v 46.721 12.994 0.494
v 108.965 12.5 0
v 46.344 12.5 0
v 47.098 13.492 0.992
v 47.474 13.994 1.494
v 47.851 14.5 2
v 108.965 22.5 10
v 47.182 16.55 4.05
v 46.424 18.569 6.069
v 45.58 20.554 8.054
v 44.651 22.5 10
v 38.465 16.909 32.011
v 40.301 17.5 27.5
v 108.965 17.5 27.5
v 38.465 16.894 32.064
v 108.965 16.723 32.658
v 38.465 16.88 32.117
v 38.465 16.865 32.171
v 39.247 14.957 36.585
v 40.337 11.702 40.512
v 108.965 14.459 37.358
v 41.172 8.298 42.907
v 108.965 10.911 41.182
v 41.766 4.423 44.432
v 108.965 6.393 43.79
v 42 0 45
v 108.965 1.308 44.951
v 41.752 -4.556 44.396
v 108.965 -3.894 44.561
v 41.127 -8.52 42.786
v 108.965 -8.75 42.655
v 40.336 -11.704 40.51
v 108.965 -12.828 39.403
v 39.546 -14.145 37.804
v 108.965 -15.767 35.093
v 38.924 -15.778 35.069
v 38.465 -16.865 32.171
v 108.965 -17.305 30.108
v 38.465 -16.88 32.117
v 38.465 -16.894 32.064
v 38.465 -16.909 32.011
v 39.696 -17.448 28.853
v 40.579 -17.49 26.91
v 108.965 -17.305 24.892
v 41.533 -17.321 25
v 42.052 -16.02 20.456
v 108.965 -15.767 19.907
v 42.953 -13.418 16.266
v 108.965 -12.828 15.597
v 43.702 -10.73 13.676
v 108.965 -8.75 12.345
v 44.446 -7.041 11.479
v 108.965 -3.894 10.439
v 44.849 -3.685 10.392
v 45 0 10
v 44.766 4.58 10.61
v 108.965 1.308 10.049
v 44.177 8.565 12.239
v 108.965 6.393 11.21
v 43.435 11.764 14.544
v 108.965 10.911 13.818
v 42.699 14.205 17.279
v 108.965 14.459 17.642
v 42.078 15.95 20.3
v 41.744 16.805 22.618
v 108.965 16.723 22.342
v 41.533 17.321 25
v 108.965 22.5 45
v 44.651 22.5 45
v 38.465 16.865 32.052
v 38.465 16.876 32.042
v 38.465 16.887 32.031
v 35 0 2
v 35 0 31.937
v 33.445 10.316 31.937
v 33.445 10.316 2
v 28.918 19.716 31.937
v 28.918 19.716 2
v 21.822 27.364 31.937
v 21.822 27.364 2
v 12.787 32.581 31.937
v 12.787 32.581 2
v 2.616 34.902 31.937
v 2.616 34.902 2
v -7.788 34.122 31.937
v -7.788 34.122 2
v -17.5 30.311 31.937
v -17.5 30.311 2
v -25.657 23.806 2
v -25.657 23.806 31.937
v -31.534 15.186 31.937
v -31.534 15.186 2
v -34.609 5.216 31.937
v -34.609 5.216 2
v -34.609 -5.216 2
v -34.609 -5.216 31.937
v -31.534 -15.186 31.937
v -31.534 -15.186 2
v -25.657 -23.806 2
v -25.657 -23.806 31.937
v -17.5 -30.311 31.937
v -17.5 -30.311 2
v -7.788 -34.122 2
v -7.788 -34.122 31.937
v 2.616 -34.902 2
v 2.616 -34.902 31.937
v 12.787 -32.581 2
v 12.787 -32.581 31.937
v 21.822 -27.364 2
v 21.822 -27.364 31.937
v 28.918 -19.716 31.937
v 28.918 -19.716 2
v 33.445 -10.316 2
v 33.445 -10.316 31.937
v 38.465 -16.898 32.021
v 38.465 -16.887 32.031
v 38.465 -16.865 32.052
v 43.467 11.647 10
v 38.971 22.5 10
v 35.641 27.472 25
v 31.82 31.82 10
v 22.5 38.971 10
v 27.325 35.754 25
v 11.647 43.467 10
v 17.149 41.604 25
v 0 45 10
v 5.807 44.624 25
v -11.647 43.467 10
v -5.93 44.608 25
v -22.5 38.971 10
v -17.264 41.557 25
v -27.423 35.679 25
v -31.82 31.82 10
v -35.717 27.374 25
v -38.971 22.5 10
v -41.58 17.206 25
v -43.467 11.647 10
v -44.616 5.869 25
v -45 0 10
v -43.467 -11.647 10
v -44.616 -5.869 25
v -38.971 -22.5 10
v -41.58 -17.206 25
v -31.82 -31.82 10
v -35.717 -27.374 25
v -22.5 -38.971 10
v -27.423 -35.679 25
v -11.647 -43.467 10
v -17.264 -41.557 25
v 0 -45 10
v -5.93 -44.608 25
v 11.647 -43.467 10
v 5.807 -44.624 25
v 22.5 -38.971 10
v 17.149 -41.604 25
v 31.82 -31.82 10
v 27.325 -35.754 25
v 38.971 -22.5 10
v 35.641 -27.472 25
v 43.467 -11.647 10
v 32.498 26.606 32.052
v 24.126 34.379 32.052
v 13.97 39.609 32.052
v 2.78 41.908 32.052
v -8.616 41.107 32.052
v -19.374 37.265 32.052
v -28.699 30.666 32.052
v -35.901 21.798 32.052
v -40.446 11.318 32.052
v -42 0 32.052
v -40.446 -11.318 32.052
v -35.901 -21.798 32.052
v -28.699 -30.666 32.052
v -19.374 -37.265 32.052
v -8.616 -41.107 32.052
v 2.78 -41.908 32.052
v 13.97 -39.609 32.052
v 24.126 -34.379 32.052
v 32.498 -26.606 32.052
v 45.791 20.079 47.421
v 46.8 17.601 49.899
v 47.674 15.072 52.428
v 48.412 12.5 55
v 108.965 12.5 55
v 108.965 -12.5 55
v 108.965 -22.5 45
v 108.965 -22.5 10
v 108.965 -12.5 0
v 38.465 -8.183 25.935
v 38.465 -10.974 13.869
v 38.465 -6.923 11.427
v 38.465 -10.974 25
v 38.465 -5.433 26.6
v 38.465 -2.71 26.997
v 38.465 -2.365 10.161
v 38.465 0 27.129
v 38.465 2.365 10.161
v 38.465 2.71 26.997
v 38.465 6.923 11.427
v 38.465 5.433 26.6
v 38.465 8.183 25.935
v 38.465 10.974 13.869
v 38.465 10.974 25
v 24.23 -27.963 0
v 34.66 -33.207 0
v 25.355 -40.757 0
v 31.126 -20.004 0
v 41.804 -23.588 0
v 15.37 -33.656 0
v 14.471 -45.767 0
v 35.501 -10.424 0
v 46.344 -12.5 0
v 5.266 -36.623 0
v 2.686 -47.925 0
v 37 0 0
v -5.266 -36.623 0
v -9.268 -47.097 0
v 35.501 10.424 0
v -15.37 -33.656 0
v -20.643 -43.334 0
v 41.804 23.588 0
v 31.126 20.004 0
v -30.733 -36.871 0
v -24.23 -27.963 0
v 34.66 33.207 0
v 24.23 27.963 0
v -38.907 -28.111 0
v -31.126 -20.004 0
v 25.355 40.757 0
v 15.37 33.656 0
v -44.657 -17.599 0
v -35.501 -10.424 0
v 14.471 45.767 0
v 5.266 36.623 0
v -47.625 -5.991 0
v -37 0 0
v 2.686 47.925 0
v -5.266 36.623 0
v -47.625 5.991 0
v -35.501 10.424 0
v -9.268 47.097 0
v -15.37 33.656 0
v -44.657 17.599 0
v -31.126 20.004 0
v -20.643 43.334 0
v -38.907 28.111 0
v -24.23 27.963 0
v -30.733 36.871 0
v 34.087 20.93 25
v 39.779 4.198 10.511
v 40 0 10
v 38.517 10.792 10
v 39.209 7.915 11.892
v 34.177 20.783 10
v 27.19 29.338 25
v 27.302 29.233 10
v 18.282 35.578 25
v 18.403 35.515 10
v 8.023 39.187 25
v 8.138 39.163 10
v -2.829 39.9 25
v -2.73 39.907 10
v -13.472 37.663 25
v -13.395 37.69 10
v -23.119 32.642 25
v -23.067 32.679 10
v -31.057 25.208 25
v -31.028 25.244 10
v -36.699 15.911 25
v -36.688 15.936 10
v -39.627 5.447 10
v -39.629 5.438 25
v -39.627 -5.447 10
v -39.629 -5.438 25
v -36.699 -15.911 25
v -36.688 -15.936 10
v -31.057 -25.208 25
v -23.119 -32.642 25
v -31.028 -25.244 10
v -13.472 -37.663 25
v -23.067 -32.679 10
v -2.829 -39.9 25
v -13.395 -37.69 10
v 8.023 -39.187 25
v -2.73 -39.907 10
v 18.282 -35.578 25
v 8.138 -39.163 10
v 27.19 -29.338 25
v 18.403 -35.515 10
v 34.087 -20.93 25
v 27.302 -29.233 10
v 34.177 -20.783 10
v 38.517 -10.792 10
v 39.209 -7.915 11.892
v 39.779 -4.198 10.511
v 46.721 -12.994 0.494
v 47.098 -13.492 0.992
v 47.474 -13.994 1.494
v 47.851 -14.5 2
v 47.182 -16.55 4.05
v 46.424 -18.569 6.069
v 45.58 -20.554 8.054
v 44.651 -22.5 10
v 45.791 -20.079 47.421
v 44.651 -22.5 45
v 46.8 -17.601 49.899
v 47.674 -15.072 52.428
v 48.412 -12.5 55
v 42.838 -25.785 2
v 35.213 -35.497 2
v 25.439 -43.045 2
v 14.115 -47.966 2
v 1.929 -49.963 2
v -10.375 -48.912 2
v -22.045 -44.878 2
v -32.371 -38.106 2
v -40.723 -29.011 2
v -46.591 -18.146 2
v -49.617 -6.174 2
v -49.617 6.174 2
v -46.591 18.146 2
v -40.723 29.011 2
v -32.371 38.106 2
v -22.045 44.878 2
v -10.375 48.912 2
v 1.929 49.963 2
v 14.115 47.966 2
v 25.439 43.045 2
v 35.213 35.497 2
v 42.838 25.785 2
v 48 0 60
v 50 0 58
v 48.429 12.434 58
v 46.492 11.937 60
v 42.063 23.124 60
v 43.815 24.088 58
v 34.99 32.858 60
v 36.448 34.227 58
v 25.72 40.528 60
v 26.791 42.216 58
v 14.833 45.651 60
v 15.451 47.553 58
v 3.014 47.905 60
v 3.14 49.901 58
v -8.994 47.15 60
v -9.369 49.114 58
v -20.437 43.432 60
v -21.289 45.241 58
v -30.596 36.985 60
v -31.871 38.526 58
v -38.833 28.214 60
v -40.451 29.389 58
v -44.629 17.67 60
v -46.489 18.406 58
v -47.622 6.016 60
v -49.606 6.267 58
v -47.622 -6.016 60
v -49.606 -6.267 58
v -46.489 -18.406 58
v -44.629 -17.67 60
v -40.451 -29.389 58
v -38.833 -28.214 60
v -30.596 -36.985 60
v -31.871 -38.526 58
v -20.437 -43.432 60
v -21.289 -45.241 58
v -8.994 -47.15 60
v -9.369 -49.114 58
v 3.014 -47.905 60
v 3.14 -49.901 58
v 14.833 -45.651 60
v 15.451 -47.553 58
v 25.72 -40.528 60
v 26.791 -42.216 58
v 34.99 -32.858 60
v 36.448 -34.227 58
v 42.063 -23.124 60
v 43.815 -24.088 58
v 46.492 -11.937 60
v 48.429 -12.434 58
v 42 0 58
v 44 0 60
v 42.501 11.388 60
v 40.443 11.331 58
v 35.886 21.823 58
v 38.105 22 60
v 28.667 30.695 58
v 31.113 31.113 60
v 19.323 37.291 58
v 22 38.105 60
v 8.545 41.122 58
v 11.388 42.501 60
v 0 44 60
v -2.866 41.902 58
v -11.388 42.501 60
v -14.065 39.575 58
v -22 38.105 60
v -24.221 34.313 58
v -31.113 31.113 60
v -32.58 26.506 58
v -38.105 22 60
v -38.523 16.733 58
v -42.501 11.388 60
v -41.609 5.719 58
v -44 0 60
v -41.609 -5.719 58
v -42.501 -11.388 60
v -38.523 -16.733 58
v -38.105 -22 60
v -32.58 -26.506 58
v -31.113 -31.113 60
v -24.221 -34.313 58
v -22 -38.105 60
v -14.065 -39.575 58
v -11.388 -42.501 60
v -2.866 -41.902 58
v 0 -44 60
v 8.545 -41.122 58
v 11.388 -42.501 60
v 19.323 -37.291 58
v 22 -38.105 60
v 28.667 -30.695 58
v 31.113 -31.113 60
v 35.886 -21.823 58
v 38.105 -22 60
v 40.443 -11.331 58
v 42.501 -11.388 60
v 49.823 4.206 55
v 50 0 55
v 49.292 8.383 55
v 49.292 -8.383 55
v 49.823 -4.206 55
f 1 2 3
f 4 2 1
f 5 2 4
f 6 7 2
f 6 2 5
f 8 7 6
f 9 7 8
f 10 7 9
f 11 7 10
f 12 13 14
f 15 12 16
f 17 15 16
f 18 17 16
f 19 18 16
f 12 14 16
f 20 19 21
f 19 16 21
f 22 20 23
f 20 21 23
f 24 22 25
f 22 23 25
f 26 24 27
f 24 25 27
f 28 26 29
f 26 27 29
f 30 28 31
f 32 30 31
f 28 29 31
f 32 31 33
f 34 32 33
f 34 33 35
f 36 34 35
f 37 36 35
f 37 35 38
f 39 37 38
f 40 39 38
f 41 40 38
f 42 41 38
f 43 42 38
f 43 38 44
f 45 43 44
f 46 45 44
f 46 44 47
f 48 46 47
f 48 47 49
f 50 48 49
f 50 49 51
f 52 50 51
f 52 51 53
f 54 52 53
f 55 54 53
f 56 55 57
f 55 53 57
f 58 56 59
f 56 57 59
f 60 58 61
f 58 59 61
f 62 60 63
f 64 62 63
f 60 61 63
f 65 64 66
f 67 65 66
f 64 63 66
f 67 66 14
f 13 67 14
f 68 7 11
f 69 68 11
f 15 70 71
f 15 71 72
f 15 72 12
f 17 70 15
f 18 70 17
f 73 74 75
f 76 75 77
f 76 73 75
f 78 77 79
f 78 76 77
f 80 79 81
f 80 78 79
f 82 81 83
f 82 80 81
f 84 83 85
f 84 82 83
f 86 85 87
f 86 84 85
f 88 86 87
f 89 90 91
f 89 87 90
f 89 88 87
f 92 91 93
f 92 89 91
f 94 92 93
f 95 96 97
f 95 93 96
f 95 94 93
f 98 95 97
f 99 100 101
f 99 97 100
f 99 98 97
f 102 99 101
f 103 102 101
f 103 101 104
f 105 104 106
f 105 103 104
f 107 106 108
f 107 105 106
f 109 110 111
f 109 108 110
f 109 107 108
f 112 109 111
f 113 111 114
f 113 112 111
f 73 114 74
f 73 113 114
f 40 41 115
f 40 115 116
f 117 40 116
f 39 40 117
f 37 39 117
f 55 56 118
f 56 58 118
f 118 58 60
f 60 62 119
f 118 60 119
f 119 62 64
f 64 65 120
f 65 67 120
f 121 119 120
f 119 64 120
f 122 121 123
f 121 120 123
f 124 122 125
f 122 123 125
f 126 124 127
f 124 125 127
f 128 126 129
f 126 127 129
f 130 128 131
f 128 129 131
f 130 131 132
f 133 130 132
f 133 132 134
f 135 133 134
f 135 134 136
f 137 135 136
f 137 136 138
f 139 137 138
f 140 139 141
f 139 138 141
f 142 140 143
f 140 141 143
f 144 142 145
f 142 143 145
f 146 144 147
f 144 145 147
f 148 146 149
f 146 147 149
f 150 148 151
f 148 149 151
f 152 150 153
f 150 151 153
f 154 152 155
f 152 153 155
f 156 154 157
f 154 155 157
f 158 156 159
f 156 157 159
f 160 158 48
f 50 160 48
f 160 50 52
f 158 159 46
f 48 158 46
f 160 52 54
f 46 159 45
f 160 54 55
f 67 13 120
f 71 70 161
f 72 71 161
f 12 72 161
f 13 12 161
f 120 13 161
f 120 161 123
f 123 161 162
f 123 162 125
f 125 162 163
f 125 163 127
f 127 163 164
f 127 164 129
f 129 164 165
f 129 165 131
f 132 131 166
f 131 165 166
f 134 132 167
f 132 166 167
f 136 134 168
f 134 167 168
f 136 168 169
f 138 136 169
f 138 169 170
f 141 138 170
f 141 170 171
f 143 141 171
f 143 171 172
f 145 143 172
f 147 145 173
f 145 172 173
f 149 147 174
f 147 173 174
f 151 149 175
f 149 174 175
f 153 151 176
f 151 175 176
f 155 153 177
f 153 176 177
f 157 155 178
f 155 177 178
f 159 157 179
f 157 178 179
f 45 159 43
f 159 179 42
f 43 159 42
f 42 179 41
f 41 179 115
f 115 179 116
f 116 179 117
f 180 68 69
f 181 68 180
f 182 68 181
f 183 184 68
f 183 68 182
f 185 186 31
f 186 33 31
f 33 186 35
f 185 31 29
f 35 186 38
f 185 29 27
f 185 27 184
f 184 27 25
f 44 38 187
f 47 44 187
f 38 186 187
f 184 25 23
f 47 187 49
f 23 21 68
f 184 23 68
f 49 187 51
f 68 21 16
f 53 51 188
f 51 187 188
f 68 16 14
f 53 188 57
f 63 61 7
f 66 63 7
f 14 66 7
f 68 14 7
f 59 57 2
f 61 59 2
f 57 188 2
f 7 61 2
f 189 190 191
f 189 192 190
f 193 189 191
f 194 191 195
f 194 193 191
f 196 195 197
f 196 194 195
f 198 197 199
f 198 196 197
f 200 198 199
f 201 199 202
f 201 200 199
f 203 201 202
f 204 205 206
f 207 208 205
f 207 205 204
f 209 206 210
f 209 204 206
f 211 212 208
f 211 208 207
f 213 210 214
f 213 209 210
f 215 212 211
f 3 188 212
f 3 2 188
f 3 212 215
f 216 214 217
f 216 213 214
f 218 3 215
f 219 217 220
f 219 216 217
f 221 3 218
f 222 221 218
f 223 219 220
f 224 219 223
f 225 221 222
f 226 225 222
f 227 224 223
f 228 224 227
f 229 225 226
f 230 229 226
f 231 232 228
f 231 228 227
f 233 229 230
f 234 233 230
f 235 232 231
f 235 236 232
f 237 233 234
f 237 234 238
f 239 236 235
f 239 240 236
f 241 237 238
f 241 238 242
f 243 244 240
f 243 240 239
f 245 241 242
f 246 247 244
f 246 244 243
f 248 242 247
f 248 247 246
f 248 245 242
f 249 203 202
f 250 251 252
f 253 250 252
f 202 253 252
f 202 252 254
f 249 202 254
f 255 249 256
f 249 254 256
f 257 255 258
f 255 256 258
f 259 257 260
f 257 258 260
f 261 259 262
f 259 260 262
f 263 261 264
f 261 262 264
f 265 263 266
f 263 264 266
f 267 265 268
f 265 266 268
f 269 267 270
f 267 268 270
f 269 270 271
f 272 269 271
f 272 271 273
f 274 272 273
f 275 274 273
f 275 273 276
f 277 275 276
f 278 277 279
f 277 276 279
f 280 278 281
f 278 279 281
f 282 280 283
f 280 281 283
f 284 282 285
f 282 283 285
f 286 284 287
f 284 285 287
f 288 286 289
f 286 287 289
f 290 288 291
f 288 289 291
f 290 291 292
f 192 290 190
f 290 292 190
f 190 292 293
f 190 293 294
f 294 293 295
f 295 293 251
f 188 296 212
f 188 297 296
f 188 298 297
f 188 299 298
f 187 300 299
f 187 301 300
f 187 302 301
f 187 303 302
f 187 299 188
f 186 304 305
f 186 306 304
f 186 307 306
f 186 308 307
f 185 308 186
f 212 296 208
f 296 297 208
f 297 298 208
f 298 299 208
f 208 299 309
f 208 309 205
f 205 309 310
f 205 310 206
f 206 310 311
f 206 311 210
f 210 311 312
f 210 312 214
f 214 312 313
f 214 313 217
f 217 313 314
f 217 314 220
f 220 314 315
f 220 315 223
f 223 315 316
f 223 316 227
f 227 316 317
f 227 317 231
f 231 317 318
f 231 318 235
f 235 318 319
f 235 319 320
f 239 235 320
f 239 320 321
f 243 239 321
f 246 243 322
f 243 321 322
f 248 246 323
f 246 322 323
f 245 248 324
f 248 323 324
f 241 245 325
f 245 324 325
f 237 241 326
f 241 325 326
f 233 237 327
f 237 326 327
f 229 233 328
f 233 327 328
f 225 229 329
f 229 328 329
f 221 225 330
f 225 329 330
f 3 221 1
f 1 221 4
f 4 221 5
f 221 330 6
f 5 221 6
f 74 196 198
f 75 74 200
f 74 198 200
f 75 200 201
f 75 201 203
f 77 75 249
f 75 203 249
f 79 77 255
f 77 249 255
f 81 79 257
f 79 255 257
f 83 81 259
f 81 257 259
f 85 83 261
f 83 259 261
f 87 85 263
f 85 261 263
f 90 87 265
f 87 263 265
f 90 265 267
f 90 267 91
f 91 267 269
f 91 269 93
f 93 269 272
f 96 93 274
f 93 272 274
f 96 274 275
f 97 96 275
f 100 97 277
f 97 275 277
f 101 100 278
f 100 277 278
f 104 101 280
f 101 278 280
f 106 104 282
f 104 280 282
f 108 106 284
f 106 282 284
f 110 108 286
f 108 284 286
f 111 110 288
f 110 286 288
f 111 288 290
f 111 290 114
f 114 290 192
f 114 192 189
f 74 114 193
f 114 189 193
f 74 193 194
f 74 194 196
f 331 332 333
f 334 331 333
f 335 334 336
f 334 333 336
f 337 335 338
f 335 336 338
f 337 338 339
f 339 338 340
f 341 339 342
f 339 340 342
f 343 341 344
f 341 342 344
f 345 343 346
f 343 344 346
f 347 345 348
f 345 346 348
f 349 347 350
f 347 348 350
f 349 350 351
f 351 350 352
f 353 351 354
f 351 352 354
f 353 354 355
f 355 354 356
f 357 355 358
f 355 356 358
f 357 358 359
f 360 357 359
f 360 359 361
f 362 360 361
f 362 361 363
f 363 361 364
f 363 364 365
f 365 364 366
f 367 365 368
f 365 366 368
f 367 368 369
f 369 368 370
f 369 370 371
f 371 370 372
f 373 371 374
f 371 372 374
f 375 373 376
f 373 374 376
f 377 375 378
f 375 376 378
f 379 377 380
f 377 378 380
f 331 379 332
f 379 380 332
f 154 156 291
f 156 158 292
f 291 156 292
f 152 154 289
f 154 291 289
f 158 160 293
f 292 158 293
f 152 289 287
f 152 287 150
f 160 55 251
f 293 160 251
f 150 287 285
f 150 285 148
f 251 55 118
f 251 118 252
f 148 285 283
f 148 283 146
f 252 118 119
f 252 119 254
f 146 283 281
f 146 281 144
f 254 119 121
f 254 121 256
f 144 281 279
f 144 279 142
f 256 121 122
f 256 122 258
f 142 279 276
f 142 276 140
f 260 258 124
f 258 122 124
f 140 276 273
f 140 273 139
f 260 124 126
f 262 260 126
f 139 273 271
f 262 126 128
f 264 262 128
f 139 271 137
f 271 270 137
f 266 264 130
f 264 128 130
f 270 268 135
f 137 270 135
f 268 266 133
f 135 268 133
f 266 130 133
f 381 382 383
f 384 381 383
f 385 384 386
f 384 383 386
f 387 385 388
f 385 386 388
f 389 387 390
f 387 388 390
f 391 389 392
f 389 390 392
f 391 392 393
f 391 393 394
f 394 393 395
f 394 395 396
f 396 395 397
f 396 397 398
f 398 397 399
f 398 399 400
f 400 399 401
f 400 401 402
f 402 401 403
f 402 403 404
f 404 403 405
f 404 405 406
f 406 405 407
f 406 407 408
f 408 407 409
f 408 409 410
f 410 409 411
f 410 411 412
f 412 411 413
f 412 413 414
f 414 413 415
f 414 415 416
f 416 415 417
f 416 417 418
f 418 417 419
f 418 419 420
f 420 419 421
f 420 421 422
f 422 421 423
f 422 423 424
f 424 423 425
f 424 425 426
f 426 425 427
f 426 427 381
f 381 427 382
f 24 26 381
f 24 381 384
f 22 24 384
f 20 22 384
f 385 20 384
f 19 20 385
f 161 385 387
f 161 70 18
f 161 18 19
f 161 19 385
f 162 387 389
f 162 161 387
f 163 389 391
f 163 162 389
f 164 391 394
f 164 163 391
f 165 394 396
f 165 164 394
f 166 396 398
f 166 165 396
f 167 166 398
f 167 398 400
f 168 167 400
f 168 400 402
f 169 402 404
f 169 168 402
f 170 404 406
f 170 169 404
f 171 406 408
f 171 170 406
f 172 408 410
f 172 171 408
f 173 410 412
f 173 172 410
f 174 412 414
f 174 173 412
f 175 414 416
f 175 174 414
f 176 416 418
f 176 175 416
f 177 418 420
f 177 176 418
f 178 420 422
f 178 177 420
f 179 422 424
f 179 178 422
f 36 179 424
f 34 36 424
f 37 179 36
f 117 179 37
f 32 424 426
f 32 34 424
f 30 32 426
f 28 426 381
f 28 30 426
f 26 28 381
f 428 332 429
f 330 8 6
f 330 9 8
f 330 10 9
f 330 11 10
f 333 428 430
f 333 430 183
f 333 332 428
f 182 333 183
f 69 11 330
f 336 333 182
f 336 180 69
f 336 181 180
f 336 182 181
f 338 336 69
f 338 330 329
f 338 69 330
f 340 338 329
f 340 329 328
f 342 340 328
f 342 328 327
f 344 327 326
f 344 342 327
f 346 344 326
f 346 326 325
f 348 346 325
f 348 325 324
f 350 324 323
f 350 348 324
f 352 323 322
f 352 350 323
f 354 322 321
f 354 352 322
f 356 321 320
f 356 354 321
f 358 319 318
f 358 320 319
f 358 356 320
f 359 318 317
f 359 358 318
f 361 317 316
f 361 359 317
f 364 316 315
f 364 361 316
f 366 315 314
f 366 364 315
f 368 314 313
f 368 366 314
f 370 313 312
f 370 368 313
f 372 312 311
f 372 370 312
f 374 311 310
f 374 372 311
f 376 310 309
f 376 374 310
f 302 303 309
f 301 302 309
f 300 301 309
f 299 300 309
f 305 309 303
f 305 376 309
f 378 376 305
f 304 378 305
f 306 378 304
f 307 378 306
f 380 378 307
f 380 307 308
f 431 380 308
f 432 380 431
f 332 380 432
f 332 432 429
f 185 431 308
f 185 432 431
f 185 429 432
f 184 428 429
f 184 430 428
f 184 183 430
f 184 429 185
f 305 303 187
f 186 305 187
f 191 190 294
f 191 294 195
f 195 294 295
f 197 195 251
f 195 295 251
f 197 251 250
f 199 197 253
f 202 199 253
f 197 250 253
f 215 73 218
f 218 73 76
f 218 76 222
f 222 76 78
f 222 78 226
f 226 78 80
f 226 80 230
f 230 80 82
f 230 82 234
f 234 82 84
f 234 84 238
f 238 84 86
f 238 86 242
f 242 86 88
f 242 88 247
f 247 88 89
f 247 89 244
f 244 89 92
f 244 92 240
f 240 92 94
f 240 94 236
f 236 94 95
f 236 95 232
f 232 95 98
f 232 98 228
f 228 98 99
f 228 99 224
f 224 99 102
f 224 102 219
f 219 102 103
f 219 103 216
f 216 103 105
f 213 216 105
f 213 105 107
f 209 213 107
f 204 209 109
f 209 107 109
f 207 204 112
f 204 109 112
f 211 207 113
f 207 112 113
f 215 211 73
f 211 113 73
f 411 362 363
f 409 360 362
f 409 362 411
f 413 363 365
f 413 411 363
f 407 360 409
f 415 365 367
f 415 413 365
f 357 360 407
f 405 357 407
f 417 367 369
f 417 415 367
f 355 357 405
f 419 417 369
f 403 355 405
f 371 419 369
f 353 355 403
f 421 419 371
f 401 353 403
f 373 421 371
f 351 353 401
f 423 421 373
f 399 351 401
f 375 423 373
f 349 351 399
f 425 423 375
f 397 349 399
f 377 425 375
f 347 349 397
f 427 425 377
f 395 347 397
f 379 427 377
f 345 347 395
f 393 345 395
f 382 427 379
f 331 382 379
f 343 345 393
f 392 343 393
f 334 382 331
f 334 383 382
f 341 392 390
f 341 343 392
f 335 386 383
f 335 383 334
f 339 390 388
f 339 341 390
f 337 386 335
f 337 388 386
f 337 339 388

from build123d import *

# Parameters (mm, degrees)
F5_DEPTH = 55
F6_R     = 17.5
F7_DEPTH = 70.5
F8_SIZE  = 10
F9_SIZE  = 2


with BuildPart() as f1:
    # F0 (on Front) → F1 (revolve)
    with BuildSketch(Plane.XZ):
        Polygon((35, 32), (35, 0), (50, 0), (50, 60), (42, 60), (42, 32), align=None)
    revolve(axis=Axis((0, 0, 18.633036), (0, 0, 1)))

    # F2 (on Front) → F3 (revolve, cut)
    with BuildSketch(Plane.XZ):
        Polygon((34.955181, 31.998791), (40, 25), (40, 10), (45, 10), (45, 25), (39.898187, 36.992304), align=None)
    revolve(axis=Axis((0, 0, 12.552274), (0, 0, 1)), mode=Mode.SUBTRACT)

    # F4 (on Top) → F5 (join)
    with BuildSketch(Plane.XY):
        with BuildLine():
            ThreePointArc((42.965102, 22.5), (47.095952, 11.585391), (48.5, 0))
            ThreePointArc((48.5, 0), (47.095952, -11.585391), (42.965102, -22.5))
            Line((42.965102, -22.5), (108.965102, -22.5))
            Line((108.965102, -22.5), (108.965102, 22.5))
            Line((108.965102, 22.5), (42.965102, 22.5))
        make_face()
    extrude(amount=F5_DEPTH)

    # F6 (on face) → F7 (cut)
    with BuildSketch(Plane.YZ.offset(108.965102)):
        with Locations((0, 27.5)):
            Circle(F6_R)
    extrude(amount=-F7_DEPTH, mode=Mode.SUBTRACT)

    # F8
    f8_edges = [f1.edges().sort_by_distance(p)[0] for p in [
        (76.808265, -22.5, 55),
        (76.808265, -22.5, 0),
        (76.808265, 22.5, 55),
        (76.808265, 22.5, 0),
    ]]
    chamfer(f8_edges, length=F8_SIZE)

    # F9
    f9_edges = [f1.edges().sort_by_distance(p)[0] for p in [
        (-50, 0, 60),
        (-42, 0, 60),
        (-35, 0, 0),
        (-50, 0, 0),
    ]]
    chamfer(f9_edges, length=F9_SIZE)


solid = f1.part
